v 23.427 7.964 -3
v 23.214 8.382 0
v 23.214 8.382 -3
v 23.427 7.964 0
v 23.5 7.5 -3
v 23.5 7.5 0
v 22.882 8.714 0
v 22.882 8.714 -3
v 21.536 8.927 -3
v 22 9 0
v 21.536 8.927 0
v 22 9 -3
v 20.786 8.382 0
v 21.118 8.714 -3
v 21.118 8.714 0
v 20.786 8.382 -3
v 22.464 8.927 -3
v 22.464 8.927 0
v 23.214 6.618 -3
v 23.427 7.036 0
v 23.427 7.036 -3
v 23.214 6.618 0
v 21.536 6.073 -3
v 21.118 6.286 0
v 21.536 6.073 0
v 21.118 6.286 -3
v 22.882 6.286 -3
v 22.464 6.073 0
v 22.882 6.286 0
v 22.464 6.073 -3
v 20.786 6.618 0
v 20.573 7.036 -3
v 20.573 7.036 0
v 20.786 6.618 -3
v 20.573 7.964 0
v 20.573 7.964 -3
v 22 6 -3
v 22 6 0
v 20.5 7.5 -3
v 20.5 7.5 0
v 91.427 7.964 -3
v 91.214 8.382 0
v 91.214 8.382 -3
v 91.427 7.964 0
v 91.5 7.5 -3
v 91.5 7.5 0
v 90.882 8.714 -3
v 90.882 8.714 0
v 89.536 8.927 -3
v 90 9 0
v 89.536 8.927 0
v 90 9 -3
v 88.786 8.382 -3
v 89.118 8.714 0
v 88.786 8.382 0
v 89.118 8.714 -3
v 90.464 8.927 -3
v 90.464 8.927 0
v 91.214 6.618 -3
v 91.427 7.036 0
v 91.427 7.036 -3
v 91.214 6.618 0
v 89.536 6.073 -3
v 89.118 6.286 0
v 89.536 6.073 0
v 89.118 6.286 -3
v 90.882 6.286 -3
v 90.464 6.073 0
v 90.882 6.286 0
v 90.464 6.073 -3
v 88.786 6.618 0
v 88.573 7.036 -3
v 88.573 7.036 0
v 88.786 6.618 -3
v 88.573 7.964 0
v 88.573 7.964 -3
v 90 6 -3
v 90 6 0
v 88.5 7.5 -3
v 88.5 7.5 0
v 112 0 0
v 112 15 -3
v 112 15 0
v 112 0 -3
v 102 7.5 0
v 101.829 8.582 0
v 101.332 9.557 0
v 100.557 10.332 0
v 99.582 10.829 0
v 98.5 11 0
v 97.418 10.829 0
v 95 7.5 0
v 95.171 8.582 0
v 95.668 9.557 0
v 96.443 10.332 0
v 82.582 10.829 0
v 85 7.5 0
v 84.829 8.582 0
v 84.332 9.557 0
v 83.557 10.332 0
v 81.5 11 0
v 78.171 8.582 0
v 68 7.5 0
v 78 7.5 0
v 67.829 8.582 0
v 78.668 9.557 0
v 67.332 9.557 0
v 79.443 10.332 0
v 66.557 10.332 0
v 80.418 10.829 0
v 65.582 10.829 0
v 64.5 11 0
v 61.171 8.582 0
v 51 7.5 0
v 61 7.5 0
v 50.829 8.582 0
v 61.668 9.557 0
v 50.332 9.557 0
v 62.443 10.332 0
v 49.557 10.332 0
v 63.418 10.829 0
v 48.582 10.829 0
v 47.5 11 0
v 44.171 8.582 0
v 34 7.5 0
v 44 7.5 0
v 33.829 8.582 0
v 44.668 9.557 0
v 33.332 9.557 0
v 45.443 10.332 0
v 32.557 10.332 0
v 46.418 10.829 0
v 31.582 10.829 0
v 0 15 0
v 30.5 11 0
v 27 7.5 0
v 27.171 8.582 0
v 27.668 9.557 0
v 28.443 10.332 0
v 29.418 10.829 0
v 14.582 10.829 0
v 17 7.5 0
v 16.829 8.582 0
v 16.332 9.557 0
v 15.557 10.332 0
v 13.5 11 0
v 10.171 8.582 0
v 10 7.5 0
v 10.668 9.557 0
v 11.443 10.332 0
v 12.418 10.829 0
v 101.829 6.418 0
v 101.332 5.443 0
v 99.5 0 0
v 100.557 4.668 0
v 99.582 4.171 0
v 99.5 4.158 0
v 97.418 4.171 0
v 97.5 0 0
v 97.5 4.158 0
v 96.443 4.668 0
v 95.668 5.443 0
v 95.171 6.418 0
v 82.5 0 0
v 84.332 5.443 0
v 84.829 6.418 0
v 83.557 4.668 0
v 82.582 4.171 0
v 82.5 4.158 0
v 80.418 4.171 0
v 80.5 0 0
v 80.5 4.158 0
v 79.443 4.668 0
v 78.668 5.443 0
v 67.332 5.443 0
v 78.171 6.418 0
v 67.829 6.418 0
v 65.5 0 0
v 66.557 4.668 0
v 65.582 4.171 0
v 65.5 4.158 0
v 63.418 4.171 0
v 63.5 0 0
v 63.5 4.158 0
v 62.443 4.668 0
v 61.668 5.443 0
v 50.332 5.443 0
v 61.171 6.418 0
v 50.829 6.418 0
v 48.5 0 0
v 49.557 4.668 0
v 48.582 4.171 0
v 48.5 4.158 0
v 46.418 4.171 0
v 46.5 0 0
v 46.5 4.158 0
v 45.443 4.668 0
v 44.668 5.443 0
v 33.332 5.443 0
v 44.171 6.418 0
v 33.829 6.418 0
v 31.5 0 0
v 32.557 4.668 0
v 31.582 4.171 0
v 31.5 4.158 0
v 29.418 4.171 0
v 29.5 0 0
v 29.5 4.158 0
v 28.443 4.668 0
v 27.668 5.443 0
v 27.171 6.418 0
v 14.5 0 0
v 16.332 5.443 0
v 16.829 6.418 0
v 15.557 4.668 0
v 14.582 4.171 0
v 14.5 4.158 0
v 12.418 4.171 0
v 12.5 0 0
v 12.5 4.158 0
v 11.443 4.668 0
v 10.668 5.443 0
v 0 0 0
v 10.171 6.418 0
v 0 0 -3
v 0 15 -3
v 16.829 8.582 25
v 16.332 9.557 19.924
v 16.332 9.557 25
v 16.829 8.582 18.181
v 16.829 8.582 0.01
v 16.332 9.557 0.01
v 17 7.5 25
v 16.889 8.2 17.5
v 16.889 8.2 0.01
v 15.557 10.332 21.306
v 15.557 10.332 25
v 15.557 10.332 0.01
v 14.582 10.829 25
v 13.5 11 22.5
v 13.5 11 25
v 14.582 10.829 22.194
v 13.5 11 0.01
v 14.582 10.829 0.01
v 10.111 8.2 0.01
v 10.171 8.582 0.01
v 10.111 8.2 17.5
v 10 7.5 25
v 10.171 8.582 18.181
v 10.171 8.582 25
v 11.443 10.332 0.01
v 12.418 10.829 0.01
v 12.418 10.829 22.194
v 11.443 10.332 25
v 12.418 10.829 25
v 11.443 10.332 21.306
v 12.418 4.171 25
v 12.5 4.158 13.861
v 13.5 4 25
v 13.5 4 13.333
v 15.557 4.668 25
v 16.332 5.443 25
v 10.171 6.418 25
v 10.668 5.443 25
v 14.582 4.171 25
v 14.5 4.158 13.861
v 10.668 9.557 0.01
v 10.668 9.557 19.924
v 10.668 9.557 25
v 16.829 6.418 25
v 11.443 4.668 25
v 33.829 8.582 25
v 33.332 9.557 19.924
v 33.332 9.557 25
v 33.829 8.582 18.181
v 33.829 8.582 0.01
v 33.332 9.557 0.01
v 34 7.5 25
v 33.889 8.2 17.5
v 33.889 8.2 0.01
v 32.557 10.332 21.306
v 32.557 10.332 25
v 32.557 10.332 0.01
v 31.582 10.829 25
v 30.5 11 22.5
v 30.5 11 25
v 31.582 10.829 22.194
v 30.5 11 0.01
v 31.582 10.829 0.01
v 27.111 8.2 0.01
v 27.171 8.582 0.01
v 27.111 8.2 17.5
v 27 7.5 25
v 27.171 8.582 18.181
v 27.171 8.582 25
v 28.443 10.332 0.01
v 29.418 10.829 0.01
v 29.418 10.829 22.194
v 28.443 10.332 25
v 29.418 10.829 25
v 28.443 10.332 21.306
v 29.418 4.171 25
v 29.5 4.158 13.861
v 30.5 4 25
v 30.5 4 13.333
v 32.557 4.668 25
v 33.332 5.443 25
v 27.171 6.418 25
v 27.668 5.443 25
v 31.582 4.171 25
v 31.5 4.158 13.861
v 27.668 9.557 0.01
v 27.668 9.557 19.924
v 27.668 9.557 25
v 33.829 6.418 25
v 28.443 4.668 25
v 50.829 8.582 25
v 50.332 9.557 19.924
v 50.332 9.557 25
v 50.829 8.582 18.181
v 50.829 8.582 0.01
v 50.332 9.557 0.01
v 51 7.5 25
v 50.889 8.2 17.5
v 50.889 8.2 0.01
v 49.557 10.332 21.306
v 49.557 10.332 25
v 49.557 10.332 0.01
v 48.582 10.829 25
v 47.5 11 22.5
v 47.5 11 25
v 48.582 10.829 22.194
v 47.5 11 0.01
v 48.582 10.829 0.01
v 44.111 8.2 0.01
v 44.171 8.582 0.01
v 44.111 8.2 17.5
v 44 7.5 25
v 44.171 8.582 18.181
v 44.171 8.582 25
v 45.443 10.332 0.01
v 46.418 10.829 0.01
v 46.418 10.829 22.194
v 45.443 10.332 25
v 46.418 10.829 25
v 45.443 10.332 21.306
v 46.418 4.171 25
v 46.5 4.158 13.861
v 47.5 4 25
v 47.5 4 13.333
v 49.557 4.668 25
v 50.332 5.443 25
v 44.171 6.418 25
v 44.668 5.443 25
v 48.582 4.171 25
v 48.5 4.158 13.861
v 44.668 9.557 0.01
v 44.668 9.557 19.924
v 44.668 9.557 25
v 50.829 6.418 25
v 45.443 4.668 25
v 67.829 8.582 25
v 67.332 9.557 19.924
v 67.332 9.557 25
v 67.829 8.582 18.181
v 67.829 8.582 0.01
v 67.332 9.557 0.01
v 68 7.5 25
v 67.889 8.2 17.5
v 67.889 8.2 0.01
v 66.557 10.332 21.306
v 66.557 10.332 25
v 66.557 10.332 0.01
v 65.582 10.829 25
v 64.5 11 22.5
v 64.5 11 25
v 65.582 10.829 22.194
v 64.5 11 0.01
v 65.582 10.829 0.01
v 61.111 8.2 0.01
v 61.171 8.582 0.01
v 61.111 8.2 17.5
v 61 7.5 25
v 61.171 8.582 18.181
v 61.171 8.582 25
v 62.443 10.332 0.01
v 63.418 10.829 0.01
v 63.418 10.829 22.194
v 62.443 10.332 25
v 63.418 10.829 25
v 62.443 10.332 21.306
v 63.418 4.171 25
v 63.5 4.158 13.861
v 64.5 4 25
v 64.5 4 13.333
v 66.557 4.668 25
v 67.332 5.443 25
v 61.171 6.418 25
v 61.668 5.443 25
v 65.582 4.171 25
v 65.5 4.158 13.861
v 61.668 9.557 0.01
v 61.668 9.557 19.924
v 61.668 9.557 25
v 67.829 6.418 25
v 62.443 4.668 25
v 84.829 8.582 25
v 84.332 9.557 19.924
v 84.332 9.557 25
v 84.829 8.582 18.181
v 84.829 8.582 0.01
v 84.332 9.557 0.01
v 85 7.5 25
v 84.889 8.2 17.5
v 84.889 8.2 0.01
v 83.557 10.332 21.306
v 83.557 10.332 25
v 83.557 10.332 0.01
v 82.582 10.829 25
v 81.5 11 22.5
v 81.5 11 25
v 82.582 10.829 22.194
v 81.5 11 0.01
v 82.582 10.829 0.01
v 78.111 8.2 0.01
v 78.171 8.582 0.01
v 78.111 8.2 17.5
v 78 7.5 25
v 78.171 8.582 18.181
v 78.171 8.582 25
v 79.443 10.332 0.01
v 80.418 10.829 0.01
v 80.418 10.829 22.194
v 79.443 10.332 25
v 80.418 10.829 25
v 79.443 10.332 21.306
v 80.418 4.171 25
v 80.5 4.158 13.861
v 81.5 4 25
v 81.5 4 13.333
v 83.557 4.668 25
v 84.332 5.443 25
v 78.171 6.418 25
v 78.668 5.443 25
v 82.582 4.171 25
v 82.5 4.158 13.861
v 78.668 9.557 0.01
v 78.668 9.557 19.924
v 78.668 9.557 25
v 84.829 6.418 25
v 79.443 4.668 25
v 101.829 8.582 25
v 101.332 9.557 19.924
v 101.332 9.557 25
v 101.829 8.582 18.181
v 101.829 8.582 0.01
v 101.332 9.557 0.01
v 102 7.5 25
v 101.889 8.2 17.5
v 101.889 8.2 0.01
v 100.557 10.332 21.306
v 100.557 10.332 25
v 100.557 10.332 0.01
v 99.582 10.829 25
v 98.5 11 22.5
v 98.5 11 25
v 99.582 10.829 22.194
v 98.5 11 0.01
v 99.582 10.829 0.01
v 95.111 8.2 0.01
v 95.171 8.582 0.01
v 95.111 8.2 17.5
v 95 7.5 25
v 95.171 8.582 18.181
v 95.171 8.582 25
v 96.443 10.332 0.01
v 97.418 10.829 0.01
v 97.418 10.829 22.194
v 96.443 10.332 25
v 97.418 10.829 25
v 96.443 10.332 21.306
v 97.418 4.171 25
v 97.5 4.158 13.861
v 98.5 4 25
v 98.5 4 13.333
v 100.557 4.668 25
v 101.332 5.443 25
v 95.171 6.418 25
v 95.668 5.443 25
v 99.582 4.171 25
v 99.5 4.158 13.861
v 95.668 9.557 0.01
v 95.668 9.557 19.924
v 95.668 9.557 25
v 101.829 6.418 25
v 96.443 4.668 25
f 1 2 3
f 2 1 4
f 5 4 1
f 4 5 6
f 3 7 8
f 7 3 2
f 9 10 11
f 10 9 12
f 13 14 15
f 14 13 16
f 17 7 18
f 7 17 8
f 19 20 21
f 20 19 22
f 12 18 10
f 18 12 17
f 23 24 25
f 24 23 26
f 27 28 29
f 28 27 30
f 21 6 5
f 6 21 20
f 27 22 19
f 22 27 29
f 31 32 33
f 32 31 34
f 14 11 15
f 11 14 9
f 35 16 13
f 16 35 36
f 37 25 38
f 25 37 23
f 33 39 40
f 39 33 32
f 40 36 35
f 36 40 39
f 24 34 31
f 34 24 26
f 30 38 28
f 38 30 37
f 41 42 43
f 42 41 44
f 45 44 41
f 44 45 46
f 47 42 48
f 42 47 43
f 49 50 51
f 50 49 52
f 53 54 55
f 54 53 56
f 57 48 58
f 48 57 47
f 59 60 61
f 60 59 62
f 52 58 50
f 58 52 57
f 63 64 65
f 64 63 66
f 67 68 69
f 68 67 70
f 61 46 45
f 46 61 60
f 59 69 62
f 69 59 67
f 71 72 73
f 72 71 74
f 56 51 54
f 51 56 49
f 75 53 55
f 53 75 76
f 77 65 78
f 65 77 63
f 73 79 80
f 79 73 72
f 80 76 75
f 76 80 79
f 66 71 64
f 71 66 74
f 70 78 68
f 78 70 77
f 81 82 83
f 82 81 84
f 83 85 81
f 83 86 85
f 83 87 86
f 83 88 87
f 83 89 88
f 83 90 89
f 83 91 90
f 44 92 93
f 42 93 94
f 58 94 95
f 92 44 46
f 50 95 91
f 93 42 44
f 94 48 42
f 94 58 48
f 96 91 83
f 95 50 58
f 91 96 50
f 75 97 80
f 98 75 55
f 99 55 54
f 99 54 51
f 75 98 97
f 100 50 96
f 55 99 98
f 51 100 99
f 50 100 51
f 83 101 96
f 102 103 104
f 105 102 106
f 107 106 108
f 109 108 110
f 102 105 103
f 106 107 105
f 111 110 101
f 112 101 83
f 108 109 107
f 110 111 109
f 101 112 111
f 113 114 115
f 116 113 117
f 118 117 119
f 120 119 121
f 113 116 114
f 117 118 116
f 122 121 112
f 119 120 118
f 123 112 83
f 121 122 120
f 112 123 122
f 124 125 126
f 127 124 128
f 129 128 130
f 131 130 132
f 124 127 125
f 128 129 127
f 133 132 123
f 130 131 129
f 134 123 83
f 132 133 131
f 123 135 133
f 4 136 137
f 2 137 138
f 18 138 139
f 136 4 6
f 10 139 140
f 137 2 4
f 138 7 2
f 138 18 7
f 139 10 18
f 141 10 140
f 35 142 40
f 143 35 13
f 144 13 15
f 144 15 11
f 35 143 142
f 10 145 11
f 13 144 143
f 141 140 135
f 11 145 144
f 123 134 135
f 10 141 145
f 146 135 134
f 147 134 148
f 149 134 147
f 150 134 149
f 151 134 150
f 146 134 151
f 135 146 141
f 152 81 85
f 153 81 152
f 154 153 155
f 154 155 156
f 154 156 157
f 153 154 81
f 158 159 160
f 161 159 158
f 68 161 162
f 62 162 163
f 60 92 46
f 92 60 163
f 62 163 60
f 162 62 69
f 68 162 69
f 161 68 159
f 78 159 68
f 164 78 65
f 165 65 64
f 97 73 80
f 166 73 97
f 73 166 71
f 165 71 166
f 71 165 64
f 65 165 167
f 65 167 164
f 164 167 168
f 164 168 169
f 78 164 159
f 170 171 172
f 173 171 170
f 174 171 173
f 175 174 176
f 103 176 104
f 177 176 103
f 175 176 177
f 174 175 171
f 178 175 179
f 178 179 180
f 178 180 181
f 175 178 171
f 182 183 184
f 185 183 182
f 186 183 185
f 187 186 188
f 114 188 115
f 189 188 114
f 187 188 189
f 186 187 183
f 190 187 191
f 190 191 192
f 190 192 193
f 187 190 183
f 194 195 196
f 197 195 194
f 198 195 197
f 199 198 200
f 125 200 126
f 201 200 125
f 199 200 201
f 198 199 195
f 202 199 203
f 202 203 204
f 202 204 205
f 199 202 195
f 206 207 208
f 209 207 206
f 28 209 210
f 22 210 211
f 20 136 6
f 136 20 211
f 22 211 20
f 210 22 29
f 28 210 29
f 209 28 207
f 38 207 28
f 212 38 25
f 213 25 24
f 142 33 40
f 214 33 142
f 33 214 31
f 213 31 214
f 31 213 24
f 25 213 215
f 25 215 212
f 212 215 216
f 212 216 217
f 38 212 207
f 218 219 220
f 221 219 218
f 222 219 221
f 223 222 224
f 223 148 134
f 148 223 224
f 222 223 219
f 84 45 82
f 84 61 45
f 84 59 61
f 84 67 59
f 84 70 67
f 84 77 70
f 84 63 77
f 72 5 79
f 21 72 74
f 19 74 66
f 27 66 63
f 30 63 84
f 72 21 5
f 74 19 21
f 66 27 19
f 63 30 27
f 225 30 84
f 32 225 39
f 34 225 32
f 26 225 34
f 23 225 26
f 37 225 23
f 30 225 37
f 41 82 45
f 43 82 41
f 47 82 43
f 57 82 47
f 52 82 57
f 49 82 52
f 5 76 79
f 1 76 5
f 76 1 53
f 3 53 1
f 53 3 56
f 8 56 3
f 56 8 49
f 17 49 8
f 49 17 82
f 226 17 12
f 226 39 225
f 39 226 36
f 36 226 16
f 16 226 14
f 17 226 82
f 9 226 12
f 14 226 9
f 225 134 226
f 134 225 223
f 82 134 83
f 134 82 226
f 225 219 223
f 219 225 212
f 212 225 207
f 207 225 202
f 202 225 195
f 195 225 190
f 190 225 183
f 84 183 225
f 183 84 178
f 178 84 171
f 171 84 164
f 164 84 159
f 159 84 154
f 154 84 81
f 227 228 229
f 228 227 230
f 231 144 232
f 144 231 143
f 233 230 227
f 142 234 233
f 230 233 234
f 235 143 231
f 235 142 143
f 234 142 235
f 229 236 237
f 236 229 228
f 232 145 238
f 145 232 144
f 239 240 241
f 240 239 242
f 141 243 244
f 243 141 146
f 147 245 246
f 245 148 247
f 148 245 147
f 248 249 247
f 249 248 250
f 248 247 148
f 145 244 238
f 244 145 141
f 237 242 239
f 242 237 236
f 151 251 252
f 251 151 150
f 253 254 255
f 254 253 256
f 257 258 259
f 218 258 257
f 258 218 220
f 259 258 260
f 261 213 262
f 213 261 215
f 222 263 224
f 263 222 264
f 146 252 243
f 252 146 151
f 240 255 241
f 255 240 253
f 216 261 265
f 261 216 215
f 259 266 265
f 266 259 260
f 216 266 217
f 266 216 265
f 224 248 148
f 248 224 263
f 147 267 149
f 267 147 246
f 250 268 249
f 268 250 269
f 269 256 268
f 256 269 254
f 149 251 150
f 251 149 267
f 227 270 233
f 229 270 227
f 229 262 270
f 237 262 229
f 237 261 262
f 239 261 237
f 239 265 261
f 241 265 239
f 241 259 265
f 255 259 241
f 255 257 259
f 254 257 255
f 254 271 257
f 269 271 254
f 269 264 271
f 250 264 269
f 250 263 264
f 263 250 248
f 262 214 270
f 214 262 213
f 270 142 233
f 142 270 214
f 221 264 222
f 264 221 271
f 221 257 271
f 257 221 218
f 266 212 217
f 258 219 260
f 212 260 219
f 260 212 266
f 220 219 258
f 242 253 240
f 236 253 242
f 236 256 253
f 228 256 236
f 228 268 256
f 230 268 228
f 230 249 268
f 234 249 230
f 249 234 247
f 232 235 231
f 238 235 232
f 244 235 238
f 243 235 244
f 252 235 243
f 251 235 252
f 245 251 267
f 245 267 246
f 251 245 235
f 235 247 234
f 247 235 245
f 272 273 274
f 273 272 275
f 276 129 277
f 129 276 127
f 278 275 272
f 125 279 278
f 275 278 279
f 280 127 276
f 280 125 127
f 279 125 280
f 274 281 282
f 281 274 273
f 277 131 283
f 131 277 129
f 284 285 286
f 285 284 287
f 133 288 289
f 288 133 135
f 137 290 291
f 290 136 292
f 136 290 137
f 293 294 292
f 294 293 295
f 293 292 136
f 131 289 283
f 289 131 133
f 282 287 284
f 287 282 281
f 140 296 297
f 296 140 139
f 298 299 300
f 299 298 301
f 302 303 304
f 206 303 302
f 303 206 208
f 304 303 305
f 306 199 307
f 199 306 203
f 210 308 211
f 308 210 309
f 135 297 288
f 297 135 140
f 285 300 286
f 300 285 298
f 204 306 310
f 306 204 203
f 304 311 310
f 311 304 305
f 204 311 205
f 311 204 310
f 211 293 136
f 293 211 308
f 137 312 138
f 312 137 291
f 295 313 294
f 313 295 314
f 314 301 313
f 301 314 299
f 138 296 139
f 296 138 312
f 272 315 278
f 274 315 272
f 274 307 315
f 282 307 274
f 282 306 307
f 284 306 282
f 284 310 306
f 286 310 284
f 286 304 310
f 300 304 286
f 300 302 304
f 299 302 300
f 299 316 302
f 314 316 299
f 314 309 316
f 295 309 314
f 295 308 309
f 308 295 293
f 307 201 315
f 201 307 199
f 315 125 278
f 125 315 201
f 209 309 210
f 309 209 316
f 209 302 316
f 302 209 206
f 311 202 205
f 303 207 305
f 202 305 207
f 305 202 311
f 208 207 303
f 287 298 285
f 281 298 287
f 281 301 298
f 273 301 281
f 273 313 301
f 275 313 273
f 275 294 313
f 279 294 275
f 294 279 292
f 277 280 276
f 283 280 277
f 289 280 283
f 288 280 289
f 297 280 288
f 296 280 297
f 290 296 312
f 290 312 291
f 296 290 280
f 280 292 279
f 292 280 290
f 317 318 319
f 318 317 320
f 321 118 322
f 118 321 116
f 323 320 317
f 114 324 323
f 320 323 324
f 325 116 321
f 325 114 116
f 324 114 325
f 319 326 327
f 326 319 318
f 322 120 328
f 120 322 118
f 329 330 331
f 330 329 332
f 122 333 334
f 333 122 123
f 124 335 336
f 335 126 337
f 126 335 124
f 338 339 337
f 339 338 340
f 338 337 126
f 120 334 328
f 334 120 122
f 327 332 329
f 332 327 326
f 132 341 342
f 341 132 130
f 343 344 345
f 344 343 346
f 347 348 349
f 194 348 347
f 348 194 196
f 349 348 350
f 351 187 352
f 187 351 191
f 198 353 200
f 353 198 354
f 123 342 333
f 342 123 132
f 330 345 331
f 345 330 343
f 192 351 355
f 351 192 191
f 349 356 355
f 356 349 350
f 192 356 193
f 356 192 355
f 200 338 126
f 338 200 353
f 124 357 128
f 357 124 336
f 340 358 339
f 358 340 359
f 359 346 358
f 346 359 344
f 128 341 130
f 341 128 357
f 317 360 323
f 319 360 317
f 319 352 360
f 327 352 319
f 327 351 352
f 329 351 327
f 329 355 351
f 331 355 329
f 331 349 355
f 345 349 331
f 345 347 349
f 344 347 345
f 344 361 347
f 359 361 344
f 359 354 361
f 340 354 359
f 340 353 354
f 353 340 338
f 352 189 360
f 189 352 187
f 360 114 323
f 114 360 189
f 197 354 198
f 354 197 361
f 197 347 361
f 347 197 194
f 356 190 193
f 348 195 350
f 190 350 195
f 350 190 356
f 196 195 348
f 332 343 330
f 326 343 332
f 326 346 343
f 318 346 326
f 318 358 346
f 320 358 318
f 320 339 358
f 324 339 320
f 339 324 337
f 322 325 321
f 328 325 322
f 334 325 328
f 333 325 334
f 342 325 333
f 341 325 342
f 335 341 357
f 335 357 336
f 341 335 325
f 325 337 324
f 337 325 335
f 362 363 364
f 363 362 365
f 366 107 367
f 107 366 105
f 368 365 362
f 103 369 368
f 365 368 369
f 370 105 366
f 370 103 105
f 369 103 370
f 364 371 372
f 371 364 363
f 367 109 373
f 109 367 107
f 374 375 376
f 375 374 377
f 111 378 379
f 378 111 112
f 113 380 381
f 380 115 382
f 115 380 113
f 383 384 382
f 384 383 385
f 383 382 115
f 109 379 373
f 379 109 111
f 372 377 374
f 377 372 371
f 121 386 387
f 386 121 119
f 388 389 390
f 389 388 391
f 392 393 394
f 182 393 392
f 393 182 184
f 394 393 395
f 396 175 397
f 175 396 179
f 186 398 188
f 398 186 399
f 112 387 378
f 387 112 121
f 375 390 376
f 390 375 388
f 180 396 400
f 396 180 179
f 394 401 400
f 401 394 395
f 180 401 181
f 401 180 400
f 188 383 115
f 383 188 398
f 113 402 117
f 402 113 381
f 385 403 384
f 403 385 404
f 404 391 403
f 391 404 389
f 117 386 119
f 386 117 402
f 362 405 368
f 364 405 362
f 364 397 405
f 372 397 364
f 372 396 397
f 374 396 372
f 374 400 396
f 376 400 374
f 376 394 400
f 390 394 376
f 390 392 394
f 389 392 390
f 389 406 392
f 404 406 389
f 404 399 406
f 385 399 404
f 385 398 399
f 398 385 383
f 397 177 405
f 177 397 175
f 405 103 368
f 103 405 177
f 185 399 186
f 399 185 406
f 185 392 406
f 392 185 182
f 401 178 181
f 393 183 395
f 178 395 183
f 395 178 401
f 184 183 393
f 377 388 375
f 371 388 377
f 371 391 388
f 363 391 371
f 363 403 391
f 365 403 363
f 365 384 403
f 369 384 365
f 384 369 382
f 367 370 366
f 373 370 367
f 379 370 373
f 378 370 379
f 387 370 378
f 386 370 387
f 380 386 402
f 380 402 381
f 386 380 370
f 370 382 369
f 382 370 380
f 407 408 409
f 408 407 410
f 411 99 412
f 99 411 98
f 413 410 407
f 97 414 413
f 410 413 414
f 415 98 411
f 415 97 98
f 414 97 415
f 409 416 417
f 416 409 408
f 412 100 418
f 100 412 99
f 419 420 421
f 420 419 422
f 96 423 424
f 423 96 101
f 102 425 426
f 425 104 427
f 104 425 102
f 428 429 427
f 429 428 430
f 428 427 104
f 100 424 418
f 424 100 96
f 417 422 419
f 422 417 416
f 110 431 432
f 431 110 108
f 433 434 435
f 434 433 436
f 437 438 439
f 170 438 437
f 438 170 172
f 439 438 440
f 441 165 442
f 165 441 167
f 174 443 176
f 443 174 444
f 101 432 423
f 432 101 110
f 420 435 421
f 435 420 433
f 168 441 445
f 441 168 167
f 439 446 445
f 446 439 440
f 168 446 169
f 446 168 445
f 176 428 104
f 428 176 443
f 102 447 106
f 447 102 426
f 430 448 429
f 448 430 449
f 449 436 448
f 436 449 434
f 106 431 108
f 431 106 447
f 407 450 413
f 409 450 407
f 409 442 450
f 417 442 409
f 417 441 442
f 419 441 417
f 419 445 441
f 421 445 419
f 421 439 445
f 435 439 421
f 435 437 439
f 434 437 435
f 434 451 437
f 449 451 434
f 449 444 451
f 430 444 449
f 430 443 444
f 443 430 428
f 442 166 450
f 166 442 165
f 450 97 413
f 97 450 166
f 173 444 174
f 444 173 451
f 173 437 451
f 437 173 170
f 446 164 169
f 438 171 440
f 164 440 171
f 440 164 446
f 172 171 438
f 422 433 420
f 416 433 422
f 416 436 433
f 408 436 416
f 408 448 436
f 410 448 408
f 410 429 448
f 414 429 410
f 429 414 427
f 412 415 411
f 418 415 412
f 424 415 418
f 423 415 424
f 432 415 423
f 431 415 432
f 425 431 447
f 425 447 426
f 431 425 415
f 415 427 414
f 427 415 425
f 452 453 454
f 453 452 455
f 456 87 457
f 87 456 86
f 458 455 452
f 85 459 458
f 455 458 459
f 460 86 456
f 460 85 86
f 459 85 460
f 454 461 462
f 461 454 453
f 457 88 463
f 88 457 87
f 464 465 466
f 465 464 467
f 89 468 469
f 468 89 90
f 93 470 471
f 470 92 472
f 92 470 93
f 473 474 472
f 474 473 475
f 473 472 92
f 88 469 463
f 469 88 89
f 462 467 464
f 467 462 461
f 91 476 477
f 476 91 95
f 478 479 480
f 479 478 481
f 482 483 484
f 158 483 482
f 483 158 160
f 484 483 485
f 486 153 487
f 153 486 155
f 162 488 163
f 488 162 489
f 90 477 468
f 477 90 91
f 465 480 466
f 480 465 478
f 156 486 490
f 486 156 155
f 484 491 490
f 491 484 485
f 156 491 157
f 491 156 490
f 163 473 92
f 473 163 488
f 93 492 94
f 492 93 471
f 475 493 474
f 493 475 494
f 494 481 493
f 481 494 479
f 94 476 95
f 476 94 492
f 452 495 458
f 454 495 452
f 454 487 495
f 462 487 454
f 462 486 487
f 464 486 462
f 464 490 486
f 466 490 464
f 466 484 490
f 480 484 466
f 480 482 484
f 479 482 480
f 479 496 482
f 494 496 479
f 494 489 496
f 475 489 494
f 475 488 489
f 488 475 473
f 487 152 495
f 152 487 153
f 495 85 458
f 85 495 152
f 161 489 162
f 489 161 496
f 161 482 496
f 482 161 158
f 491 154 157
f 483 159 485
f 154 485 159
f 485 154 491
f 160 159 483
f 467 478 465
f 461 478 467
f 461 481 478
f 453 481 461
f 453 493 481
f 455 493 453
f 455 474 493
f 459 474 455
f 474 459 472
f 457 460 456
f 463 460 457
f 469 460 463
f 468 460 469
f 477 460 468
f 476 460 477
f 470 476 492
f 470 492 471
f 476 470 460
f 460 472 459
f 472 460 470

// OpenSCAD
$fn=20*1; // circle accuracy

E = 0.01*1; // small value used to avoid dumb roundings

/* [General] */

// Number of hooks
num_hooks = 6; // [2:30]

// Diameter of each hook peg (mm)
hook_dia = 7; // [2:30]

// margin around hooks in left-right dimension (mm)
x_margin = 10; // [2:20]

// margin around hooks in up-down dimension (mm)
y_margin = 4; // [2:20]

// length of each hook peg from base (mm)
hook_length=25; // [4:50]

// How thick is the base plate? (mm)
base_thickness = 3; // [1:10]

// What is the diameter of the two mounting holes (zero to disable)? (mm)
hole_dia = 3; // [0:15]

/* [Hook details] */

// how deep is the gap in the peg (zero for no gap)? (%)
gap_depth_percentage = 40; // [0:90]

// how far down onto the peg does the gap start? Must be greater than gap percentage B. (%)
gap_percentage_a = 90; // [70:100]

// how far down onto the peg does the gap end? Must be less than gap percentage A. (%)
gap_percentage_b = 70; // [0:70]

gap_a = gap_percentage_a/100 * hook_length;
gap_b = gap_percentage_b/100 * hook_length;
gap_depth = hook_dia*(0.5-gap_depth_percentage/100);

// How wide is the bottom triangluar support (zero for none)? (mm)
support_width=2;

total_width = (x_margin+hook_dia)*num_hooks+x_margin;
total_height = y_margin+hook_dia+y_margin;

translate([0,0,-base_thickness]) difference() {
    cube([total_width,total_height,base_thickness]);
    for (i = [0,num_hooks-2]) {
        x = x_margin*1.5 + hook_dia + i*(x_margin+hook_dia);
        y = y_margin + hook_dia/2;

        translate([x,y,-E]) cylinder(d=hole_dia, h=base_thickness*1.5);
    }
}

for (i = [0:num_hooks-1]) {
    x = x_margin + hook_dia/2 + i*(x_margin+hook_dia);
    y = y_margin + hook_dia/2;
    translate([x,y,0]) difference() {
        union() {
            cylinder(d=hook_dia,h=hook_length);
            rotate([0,-90,0]) translate([0,0,-support_width/2]) linear_extrude(support_width) polygon([
                [0,0],
                [hook_length,0],
                [0,-(y_margin+hook_dia/2)]
            ]);
        }
        rotate([0,-90,0]) translate([0,0,-hook_dia/2-0.5]) linear_extrude(hook_dia+1) polygon([
            [E,gap_depth],
            [E,hook_dia],
            [gap_a,hook_dia],
            [gap_a,hook_dia/2],
            [gap_b,gap_depth]
        ]);
    }
}
